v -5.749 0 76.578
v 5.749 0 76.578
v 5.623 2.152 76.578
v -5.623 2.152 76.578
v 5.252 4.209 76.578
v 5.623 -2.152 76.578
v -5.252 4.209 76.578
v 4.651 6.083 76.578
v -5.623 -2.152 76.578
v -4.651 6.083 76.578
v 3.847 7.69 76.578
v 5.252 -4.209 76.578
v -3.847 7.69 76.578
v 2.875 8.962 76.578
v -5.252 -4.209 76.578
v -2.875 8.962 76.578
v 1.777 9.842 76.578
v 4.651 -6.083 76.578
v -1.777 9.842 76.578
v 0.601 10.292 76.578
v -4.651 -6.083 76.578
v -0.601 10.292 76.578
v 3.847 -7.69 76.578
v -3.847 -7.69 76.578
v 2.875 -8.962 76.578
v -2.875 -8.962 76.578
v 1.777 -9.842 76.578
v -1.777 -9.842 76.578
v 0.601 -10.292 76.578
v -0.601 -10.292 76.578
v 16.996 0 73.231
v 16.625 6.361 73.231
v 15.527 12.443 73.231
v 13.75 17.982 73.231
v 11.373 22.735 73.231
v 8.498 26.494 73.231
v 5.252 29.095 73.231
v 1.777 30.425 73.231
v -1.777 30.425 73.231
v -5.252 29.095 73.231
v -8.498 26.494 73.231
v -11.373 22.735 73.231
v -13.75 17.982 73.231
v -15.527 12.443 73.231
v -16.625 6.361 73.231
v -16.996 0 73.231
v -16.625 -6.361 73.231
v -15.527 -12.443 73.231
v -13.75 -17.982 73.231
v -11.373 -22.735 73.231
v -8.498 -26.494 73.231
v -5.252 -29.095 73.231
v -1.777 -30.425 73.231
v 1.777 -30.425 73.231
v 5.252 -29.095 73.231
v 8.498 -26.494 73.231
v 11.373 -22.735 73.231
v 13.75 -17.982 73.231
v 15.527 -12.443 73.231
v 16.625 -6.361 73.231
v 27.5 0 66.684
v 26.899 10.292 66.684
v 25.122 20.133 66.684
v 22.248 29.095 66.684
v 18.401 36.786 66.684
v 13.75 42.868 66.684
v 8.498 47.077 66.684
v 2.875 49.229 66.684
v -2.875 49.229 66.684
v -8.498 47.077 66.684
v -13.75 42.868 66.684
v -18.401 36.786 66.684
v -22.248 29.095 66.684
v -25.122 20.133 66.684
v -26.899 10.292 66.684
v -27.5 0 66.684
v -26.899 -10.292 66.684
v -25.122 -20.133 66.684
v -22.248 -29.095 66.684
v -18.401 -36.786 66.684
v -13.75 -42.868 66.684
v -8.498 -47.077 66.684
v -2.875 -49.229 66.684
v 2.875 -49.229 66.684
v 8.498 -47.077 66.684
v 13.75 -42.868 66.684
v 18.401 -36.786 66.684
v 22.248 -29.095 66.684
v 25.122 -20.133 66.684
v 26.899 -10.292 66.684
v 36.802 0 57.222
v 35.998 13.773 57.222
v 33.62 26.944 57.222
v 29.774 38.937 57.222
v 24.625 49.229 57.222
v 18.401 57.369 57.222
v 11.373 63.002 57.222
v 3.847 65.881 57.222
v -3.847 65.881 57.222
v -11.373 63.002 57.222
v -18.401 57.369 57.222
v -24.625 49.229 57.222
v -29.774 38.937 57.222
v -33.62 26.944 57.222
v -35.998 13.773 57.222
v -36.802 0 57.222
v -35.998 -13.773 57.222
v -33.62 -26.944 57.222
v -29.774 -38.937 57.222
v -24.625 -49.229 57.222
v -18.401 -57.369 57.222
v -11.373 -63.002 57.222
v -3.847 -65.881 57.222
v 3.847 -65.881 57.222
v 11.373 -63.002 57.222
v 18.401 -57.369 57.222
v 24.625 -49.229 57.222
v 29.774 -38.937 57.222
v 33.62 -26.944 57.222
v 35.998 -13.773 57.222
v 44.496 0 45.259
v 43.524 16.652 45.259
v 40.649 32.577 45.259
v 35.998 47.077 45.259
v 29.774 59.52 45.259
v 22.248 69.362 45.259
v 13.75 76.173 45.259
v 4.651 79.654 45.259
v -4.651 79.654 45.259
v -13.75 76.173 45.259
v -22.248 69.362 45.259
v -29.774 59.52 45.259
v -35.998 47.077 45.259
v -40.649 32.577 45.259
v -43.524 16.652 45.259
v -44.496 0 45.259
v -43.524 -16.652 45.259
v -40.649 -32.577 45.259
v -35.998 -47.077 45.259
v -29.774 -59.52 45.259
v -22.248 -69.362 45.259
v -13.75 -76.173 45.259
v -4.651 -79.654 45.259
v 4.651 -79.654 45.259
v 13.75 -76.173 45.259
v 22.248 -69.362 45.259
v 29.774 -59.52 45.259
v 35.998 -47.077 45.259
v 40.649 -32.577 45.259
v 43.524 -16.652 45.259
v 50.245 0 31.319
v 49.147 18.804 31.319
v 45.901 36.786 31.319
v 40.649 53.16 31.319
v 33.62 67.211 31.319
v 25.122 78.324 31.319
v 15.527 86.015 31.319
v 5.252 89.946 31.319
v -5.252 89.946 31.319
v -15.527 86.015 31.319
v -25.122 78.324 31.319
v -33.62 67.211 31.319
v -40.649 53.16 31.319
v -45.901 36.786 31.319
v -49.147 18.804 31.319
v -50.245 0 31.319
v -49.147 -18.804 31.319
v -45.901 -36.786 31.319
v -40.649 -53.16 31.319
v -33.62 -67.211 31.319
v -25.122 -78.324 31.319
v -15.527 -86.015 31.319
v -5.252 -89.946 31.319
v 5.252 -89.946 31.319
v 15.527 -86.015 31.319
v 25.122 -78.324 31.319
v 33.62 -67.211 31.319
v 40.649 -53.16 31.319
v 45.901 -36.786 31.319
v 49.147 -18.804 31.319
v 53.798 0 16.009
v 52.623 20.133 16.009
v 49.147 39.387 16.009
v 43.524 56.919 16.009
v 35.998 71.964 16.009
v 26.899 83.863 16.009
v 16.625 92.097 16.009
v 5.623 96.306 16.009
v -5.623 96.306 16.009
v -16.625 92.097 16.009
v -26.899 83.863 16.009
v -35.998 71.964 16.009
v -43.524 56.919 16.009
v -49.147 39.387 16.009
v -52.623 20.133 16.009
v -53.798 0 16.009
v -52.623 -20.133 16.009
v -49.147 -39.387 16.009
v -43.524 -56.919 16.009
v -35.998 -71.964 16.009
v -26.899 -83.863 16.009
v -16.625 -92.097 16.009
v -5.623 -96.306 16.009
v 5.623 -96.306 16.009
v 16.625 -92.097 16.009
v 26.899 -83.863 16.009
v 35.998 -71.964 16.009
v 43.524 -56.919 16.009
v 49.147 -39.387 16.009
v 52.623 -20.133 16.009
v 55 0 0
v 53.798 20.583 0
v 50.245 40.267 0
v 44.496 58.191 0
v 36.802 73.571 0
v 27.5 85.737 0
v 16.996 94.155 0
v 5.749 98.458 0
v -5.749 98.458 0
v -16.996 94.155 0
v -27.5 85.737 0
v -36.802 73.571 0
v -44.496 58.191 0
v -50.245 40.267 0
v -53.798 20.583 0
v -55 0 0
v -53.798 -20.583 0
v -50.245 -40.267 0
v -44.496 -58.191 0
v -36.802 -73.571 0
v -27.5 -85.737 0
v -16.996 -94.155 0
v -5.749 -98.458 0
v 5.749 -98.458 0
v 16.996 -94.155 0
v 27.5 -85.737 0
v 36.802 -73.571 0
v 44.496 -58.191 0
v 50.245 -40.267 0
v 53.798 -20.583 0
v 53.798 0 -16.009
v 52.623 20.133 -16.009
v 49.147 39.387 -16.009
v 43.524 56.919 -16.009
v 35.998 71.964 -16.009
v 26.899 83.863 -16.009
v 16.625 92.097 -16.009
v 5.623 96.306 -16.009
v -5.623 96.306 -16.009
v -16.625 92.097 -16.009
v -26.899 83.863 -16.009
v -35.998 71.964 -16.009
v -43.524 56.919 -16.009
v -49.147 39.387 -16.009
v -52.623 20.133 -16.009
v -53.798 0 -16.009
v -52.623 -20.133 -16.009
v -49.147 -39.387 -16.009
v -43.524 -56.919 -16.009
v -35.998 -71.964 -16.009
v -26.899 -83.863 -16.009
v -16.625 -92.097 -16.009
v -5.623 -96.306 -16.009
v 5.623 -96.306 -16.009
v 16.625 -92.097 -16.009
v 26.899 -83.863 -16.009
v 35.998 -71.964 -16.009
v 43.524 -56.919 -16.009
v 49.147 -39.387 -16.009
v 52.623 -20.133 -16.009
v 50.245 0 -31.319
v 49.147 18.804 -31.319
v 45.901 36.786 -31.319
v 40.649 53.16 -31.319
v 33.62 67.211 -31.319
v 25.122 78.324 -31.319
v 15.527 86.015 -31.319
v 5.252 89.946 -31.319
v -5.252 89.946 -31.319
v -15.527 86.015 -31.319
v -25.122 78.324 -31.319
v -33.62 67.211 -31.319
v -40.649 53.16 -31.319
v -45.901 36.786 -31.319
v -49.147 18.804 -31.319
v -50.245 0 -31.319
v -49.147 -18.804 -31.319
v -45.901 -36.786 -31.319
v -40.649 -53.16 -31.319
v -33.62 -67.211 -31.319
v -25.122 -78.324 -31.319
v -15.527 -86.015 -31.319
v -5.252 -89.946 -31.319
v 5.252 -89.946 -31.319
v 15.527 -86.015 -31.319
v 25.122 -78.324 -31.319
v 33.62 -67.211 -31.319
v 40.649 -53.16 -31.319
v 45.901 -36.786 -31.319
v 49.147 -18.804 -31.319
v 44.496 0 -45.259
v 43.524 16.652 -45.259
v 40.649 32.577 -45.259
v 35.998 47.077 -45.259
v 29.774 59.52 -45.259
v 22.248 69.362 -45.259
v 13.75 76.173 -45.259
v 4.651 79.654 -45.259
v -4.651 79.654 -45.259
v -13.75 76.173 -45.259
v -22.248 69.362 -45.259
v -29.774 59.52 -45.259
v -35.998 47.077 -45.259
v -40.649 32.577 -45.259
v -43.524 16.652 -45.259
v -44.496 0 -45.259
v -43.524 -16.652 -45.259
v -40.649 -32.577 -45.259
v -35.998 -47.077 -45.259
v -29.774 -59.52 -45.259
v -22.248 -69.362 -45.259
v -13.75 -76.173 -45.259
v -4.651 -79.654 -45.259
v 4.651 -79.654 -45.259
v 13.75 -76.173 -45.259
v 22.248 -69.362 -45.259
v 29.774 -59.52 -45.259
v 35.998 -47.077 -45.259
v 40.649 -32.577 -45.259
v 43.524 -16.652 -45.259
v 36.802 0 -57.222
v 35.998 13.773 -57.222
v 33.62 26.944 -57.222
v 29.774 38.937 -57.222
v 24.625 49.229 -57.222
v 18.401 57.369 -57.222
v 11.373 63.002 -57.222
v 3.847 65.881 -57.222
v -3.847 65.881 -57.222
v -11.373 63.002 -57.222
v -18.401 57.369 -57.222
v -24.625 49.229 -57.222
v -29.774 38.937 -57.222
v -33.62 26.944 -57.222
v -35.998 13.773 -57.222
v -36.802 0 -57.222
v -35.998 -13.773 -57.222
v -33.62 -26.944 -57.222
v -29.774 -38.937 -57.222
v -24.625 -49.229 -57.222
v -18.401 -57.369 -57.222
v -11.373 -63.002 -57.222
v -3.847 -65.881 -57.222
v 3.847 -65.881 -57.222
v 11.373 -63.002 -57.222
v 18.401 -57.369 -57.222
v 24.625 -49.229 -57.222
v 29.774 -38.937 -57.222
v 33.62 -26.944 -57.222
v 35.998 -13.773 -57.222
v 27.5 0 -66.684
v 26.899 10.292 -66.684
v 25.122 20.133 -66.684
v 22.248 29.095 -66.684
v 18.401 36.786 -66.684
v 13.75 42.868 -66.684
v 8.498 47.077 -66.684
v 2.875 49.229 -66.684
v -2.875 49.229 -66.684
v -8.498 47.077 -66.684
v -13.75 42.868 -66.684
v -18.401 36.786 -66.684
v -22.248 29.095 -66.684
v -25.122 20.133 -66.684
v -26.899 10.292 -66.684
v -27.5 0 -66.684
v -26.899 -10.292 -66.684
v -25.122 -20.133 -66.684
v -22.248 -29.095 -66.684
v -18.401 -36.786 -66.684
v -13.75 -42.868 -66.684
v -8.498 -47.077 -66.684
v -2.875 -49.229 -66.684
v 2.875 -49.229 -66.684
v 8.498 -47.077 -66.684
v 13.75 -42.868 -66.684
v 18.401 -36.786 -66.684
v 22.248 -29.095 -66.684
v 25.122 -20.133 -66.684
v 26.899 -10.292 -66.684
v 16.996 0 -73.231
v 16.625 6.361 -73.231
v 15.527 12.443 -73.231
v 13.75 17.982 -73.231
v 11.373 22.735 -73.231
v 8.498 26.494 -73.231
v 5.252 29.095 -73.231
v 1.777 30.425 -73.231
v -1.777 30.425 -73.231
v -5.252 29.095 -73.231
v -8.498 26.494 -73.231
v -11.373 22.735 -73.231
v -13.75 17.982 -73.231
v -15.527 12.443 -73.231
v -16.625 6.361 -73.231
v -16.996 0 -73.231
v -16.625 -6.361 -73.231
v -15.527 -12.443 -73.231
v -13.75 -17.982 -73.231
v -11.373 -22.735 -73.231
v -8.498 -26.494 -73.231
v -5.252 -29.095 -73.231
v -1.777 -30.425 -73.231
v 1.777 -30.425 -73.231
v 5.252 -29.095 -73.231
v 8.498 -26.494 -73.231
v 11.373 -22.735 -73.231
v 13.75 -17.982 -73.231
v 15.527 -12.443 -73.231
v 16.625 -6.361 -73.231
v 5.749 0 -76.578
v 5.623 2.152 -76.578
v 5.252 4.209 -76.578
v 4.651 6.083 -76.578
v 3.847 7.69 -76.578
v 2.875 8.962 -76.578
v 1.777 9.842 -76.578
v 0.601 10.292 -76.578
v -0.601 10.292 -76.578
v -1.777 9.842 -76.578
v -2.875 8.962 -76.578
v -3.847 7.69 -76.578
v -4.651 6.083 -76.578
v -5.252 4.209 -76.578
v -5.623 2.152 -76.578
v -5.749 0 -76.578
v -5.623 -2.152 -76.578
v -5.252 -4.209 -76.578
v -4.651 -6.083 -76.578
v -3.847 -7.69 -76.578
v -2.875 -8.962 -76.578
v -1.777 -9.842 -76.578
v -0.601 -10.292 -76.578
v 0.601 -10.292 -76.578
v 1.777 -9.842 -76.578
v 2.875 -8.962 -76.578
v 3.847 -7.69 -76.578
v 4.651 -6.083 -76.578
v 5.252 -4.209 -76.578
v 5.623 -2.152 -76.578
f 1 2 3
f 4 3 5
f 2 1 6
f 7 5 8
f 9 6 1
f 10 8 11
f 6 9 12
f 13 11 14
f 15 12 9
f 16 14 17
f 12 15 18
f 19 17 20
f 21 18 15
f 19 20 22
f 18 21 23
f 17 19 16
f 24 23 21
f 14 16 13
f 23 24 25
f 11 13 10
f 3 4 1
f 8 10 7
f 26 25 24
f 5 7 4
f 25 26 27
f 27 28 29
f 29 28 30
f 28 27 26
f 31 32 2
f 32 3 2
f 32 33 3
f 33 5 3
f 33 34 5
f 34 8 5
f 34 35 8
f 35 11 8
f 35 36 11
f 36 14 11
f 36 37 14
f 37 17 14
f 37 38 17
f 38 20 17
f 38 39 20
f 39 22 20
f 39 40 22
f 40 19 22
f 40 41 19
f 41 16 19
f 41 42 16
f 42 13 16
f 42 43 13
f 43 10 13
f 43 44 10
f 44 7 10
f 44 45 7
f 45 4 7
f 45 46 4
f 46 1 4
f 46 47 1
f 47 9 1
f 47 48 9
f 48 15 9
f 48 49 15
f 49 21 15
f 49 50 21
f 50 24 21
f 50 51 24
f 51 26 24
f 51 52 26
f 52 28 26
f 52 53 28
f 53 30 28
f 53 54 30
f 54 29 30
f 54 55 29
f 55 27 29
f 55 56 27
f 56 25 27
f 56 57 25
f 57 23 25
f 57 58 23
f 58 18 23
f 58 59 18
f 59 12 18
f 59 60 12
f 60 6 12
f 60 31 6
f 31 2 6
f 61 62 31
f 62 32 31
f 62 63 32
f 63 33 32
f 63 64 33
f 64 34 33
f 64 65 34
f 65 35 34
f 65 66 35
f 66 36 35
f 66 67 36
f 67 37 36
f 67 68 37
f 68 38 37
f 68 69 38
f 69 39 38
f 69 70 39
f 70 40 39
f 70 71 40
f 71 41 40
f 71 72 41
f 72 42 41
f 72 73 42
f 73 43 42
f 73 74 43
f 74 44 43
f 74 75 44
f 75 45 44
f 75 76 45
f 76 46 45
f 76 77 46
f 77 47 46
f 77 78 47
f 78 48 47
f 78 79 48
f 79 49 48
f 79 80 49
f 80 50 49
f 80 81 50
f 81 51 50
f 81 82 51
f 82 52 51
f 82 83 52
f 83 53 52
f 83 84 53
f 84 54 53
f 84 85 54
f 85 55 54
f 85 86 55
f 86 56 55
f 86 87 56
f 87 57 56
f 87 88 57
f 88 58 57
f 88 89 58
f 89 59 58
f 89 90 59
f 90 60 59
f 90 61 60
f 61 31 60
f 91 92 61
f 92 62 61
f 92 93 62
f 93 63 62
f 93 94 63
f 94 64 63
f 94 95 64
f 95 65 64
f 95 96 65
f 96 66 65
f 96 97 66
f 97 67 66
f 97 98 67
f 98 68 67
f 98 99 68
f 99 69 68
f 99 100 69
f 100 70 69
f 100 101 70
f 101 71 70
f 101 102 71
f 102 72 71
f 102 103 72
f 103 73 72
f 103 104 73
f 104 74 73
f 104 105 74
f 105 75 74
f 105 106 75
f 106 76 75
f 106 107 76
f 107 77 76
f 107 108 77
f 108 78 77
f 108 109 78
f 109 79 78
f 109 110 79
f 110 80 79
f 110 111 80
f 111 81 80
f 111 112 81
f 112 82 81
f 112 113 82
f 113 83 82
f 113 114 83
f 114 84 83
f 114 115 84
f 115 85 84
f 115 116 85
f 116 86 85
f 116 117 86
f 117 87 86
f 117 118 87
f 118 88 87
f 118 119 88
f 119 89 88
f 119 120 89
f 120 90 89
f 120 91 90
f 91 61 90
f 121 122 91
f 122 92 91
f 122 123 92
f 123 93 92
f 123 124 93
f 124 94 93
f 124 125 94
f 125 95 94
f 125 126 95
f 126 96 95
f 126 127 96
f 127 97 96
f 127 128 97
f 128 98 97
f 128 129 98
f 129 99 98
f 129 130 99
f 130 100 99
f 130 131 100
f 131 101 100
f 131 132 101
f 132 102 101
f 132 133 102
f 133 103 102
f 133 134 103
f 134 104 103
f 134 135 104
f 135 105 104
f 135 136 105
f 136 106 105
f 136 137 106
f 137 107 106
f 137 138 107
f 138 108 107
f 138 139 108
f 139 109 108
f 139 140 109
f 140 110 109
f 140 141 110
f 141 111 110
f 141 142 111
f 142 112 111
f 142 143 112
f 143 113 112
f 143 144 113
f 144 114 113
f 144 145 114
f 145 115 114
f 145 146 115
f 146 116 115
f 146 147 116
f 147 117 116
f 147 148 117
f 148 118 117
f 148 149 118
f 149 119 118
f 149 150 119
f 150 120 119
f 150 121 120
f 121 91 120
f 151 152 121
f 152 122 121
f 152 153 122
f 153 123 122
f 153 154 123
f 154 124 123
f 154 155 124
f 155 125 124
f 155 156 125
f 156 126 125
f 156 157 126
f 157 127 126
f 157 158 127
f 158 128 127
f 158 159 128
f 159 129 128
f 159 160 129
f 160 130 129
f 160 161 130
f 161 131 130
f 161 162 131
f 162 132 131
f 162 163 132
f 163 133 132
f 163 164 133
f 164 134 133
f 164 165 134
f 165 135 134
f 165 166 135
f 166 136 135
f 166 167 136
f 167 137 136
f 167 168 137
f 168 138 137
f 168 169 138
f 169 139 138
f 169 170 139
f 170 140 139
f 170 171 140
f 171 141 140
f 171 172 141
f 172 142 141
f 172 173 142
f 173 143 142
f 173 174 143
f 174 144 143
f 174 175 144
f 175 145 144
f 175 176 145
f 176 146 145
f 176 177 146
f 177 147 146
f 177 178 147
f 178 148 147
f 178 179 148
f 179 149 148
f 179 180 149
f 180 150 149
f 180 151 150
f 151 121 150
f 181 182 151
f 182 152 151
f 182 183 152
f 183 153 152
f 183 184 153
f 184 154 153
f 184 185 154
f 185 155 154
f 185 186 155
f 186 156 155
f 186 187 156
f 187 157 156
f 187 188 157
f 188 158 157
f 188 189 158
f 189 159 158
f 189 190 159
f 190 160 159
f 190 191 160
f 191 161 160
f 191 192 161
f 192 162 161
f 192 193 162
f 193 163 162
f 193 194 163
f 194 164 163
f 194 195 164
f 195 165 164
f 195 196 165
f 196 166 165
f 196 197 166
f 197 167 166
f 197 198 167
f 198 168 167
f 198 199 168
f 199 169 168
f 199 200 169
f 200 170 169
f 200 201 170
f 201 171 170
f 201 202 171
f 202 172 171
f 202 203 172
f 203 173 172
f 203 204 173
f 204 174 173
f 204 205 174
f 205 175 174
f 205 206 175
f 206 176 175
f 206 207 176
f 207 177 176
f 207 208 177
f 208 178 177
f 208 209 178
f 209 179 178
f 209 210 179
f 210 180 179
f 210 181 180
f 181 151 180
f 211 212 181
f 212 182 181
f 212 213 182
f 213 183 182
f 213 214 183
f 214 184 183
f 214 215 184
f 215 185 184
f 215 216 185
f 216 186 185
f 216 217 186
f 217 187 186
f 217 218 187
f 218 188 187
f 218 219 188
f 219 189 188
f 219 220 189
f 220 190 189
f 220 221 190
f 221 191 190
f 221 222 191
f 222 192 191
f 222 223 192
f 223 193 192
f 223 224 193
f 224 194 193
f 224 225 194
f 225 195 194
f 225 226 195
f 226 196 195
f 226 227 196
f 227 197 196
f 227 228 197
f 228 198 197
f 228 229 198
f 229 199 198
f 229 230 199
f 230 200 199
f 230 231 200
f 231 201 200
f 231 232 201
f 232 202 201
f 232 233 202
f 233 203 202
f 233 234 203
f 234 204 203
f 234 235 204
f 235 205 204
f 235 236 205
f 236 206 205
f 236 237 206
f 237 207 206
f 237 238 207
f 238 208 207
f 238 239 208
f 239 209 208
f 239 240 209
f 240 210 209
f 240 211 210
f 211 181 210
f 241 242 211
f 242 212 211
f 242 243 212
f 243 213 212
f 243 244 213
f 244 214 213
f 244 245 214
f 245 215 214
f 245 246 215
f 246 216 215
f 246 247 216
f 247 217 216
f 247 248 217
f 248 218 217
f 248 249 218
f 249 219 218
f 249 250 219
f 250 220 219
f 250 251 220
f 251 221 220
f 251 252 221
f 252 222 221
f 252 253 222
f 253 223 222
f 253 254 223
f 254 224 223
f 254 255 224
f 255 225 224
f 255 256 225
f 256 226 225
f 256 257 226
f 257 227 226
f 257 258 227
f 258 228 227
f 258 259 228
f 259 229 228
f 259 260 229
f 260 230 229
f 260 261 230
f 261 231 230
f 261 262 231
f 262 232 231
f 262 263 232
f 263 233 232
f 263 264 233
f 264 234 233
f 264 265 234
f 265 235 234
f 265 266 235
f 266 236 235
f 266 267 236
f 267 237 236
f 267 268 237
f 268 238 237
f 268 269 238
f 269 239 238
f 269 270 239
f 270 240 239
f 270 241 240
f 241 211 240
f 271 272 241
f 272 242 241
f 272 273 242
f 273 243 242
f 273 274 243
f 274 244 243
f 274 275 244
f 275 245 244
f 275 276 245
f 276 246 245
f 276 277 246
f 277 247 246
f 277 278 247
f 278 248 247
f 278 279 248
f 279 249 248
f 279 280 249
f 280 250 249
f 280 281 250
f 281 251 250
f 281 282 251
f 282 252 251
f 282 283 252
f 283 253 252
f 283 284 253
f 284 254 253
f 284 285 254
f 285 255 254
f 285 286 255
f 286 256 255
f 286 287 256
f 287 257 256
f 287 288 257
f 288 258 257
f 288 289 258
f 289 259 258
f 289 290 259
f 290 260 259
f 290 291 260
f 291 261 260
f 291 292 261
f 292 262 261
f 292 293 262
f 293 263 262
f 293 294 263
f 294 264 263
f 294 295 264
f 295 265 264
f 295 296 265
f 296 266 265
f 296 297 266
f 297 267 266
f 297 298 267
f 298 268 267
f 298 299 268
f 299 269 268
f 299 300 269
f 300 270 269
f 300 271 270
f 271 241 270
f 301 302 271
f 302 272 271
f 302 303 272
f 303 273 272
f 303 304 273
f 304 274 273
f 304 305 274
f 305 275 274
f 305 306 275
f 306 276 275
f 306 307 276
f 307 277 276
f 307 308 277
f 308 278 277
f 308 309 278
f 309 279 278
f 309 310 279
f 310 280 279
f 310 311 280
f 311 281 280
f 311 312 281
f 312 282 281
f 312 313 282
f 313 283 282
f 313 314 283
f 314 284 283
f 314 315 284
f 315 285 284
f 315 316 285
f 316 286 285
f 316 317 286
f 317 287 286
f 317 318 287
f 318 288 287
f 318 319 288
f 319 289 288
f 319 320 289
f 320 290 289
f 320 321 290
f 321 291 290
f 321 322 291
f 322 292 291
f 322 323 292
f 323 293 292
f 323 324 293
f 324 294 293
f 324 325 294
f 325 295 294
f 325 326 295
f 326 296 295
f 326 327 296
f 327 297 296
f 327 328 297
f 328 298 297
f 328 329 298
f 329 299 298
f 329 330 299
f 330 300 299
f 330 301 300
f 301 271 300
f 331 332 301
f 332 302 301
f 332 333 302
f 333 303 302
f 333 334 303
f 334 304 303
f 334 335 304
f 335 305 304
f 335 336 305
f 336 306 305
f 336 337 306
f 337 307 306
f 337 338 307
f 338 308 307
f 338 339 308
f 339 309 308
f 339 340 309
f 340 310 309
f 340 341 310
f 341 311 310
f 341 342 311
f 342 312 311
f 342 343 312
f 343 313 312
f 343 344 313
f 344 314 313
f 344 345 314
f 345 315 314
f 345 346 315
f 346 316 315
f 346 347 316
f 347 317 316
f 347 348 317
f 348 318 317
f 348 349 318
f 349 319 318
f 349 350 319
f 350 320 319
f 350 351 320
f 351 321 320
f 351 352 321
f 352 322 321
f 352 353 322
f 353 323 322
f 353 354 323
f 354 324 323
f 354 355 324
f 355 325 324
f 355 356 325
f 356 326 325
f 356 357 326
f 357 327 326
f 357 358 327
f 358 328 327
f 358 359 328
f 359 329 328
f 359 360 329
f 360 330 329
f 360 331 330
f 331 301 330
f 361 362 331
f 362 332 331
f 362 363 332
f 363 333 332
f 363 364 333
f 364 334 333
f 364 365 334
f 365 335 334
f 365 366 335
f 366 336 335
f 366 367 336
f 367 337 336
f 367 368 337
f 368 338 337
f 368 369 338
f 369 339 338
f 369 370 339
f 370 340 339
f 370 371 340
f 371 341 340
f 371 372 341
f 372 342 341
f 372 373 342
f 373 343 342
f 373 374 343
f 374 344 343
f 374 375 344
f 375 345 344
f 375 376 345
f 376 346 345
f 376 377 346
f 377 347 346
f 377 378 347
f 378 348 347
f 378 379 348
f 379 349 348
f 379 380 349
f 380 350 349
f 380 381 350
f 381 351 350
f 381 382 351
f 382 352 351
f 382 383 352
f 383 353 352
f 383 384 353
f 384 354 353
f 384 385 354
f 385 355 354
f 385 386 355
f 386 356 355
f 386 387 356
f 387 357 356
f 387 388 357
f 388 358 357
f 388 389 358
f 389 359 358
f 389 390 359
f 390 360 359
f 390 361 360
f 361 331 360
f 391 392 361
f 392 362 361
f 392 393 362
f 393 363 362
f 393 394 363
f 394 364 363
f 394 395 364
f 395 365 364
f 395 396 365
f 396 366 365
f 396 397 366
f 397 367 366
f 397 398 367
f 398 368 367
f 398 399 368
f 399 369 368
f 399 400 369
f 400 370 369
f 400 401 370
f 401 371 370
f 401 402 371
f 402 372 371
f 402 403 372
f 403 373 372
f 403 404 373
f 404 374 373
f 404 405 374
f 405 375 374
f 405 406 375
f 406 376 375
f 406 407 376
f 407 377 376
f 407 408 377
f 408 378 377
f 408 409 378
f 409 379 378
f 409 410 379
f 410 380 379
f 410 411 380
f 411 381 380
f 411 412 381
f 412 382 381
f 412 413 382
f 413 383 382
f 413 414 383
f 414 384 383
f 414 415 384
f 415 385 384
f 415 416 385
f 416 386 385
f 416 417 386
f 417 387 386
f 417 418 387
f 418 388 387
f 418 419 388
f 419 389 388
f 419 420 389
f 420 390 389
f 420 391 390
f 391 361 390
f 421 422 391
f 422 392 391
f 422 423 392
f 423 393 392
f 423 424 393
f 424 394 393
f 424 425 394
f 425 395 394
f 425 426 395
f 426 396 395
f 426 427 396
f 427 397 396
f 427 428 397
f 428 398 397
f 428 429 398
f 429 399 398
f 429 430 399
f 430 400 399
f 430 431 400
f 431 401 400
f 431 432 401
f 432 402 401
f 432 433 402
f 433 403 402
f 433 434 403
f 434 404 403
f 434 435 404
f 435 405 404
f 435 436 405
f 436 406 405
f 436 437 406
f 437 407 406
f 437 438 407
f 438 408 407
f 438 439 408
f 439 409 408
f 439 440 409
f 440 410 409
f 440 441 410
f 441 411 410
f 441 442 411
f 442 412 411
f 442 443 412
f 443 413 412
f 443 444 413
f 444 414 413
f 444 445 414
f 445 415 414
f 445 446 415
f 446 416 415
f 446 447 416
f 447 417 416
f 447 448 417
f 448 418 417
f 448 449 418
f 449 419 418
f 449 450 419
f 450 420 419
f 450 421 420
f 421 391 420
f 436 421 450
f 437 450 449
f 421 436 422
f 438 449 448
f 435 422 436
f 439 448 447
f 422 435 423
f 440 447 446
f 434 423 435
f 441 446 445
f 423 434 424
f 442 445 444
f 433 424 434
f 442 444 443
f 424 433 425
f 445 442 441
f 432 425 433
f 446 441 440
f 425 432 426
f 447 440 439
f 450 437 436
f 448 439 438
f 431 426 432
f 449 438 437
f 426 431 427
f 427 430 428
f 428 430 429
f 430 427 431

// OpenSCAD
// Generated by SolidPython 1.0.1 on 2020-07-29 00:46:46


scale(v = [5, 9, 7]) {
	sphere(r = 11);
}
/***********************************************
*********      SolidPython code:      **********
************************************************
 
# import packages: SolidPython
from solid import *
from solid.utils import *
from itertools import chain, combinations, permutations


class Resize:

    def __init__(self, scad_file):
        self.scad_file = scad_file
        #self.scad_file = import_scad(scad_file)
        # cone/cylinder param:
        self.r1 = 0
        self.r2 = 0
        self.h = 0
        # rectangular prism param:
        self.w = 0
        self.l = 0
        # ellipse param:
        self.r = 0

    # import OpenScad code (file name corresponds to shape)


    # classify shape + parameters
    def assign(self, param1, param2, param3):
        if self.scad_file == 'cone.scad':
            self.r1 = param1
            self.r2 = param2
            self.h = param3
        elif self.scad_file == 'cylinder.scad':
            self.r1 = param1
            self.r2 = param2
            self.h = param3
        elif self.scad_file == 'rectangularPrism.scad':
            self.h = param1
            self.l = param2
            self.w = param3
        else:
            self.r = param1
            self.h = param2

    # resize parameters
    def iterate(self):
        x = range(3, 20, 2)
        i = 1
        if self.scad_file == 'cone.scad':
            tempList = list(permutations(x, 2))
            for temp in tempList:
                param1 = temp[0]
                param2 = temp[1]
                filepath = 'produced_scad_files/' + 'cone' + str(param1) + '_' + str(param2) + '_' + '.scad'
                scad_render_to_file(cylinder(h=param1, r1=param2, r2=0), filepath)

        elif self.scad_file == 'cylinder.scad':
            tempList = list(permutations(x, 3))
            for temp in tempList:
                param1 = temp[0]
                param2 = temp[1]
                filepath = 'produced_scad_files/' + 'cylinder' + str(param1) + '_' + str(param2) + '_' + '.scad'
                scad_render_to_file(cylinder(h=param1, r1=param2, r2=param2), filepath)

        elif self.scad_file == 'rectangularPrism.scad':
            tempList = list(permutations(x, 3))
            for temp in tempList:
                param1 = temp[0]
                param2 = temp[1]
                param3 = temp[2]
                filepath = 'produced_scad_files/' + 'rectangularPrism' + str(param1) + '_' + str(param2) + '_' + str(
                    param3) + '.scad'
                scad_render_to_file(cube(size=(param1, param2, param3)), filepath)

        elif self.scad_file == 'ellipse.scad':
            tempList = list(permutations(x, 4))
            for temp in tempList:
                param1 = temp[0]
                param2 = temp[1]
                param3 = temp[2]
                param4 = temp[3]
                filepath = 'produced_scad_files/' + 'ellipse' + str(param1) + '_' + str(param2) + '_' + str(param3) + '_' + str(param4) + '.scad'
                scad_render_to_file(scale([param1, param2, param3])(sphere(r=param4)), filepath)

    def render_to_scadfile(self):
        scad_render_to_file(scad, 'example.scad') 
 
************************************************/
